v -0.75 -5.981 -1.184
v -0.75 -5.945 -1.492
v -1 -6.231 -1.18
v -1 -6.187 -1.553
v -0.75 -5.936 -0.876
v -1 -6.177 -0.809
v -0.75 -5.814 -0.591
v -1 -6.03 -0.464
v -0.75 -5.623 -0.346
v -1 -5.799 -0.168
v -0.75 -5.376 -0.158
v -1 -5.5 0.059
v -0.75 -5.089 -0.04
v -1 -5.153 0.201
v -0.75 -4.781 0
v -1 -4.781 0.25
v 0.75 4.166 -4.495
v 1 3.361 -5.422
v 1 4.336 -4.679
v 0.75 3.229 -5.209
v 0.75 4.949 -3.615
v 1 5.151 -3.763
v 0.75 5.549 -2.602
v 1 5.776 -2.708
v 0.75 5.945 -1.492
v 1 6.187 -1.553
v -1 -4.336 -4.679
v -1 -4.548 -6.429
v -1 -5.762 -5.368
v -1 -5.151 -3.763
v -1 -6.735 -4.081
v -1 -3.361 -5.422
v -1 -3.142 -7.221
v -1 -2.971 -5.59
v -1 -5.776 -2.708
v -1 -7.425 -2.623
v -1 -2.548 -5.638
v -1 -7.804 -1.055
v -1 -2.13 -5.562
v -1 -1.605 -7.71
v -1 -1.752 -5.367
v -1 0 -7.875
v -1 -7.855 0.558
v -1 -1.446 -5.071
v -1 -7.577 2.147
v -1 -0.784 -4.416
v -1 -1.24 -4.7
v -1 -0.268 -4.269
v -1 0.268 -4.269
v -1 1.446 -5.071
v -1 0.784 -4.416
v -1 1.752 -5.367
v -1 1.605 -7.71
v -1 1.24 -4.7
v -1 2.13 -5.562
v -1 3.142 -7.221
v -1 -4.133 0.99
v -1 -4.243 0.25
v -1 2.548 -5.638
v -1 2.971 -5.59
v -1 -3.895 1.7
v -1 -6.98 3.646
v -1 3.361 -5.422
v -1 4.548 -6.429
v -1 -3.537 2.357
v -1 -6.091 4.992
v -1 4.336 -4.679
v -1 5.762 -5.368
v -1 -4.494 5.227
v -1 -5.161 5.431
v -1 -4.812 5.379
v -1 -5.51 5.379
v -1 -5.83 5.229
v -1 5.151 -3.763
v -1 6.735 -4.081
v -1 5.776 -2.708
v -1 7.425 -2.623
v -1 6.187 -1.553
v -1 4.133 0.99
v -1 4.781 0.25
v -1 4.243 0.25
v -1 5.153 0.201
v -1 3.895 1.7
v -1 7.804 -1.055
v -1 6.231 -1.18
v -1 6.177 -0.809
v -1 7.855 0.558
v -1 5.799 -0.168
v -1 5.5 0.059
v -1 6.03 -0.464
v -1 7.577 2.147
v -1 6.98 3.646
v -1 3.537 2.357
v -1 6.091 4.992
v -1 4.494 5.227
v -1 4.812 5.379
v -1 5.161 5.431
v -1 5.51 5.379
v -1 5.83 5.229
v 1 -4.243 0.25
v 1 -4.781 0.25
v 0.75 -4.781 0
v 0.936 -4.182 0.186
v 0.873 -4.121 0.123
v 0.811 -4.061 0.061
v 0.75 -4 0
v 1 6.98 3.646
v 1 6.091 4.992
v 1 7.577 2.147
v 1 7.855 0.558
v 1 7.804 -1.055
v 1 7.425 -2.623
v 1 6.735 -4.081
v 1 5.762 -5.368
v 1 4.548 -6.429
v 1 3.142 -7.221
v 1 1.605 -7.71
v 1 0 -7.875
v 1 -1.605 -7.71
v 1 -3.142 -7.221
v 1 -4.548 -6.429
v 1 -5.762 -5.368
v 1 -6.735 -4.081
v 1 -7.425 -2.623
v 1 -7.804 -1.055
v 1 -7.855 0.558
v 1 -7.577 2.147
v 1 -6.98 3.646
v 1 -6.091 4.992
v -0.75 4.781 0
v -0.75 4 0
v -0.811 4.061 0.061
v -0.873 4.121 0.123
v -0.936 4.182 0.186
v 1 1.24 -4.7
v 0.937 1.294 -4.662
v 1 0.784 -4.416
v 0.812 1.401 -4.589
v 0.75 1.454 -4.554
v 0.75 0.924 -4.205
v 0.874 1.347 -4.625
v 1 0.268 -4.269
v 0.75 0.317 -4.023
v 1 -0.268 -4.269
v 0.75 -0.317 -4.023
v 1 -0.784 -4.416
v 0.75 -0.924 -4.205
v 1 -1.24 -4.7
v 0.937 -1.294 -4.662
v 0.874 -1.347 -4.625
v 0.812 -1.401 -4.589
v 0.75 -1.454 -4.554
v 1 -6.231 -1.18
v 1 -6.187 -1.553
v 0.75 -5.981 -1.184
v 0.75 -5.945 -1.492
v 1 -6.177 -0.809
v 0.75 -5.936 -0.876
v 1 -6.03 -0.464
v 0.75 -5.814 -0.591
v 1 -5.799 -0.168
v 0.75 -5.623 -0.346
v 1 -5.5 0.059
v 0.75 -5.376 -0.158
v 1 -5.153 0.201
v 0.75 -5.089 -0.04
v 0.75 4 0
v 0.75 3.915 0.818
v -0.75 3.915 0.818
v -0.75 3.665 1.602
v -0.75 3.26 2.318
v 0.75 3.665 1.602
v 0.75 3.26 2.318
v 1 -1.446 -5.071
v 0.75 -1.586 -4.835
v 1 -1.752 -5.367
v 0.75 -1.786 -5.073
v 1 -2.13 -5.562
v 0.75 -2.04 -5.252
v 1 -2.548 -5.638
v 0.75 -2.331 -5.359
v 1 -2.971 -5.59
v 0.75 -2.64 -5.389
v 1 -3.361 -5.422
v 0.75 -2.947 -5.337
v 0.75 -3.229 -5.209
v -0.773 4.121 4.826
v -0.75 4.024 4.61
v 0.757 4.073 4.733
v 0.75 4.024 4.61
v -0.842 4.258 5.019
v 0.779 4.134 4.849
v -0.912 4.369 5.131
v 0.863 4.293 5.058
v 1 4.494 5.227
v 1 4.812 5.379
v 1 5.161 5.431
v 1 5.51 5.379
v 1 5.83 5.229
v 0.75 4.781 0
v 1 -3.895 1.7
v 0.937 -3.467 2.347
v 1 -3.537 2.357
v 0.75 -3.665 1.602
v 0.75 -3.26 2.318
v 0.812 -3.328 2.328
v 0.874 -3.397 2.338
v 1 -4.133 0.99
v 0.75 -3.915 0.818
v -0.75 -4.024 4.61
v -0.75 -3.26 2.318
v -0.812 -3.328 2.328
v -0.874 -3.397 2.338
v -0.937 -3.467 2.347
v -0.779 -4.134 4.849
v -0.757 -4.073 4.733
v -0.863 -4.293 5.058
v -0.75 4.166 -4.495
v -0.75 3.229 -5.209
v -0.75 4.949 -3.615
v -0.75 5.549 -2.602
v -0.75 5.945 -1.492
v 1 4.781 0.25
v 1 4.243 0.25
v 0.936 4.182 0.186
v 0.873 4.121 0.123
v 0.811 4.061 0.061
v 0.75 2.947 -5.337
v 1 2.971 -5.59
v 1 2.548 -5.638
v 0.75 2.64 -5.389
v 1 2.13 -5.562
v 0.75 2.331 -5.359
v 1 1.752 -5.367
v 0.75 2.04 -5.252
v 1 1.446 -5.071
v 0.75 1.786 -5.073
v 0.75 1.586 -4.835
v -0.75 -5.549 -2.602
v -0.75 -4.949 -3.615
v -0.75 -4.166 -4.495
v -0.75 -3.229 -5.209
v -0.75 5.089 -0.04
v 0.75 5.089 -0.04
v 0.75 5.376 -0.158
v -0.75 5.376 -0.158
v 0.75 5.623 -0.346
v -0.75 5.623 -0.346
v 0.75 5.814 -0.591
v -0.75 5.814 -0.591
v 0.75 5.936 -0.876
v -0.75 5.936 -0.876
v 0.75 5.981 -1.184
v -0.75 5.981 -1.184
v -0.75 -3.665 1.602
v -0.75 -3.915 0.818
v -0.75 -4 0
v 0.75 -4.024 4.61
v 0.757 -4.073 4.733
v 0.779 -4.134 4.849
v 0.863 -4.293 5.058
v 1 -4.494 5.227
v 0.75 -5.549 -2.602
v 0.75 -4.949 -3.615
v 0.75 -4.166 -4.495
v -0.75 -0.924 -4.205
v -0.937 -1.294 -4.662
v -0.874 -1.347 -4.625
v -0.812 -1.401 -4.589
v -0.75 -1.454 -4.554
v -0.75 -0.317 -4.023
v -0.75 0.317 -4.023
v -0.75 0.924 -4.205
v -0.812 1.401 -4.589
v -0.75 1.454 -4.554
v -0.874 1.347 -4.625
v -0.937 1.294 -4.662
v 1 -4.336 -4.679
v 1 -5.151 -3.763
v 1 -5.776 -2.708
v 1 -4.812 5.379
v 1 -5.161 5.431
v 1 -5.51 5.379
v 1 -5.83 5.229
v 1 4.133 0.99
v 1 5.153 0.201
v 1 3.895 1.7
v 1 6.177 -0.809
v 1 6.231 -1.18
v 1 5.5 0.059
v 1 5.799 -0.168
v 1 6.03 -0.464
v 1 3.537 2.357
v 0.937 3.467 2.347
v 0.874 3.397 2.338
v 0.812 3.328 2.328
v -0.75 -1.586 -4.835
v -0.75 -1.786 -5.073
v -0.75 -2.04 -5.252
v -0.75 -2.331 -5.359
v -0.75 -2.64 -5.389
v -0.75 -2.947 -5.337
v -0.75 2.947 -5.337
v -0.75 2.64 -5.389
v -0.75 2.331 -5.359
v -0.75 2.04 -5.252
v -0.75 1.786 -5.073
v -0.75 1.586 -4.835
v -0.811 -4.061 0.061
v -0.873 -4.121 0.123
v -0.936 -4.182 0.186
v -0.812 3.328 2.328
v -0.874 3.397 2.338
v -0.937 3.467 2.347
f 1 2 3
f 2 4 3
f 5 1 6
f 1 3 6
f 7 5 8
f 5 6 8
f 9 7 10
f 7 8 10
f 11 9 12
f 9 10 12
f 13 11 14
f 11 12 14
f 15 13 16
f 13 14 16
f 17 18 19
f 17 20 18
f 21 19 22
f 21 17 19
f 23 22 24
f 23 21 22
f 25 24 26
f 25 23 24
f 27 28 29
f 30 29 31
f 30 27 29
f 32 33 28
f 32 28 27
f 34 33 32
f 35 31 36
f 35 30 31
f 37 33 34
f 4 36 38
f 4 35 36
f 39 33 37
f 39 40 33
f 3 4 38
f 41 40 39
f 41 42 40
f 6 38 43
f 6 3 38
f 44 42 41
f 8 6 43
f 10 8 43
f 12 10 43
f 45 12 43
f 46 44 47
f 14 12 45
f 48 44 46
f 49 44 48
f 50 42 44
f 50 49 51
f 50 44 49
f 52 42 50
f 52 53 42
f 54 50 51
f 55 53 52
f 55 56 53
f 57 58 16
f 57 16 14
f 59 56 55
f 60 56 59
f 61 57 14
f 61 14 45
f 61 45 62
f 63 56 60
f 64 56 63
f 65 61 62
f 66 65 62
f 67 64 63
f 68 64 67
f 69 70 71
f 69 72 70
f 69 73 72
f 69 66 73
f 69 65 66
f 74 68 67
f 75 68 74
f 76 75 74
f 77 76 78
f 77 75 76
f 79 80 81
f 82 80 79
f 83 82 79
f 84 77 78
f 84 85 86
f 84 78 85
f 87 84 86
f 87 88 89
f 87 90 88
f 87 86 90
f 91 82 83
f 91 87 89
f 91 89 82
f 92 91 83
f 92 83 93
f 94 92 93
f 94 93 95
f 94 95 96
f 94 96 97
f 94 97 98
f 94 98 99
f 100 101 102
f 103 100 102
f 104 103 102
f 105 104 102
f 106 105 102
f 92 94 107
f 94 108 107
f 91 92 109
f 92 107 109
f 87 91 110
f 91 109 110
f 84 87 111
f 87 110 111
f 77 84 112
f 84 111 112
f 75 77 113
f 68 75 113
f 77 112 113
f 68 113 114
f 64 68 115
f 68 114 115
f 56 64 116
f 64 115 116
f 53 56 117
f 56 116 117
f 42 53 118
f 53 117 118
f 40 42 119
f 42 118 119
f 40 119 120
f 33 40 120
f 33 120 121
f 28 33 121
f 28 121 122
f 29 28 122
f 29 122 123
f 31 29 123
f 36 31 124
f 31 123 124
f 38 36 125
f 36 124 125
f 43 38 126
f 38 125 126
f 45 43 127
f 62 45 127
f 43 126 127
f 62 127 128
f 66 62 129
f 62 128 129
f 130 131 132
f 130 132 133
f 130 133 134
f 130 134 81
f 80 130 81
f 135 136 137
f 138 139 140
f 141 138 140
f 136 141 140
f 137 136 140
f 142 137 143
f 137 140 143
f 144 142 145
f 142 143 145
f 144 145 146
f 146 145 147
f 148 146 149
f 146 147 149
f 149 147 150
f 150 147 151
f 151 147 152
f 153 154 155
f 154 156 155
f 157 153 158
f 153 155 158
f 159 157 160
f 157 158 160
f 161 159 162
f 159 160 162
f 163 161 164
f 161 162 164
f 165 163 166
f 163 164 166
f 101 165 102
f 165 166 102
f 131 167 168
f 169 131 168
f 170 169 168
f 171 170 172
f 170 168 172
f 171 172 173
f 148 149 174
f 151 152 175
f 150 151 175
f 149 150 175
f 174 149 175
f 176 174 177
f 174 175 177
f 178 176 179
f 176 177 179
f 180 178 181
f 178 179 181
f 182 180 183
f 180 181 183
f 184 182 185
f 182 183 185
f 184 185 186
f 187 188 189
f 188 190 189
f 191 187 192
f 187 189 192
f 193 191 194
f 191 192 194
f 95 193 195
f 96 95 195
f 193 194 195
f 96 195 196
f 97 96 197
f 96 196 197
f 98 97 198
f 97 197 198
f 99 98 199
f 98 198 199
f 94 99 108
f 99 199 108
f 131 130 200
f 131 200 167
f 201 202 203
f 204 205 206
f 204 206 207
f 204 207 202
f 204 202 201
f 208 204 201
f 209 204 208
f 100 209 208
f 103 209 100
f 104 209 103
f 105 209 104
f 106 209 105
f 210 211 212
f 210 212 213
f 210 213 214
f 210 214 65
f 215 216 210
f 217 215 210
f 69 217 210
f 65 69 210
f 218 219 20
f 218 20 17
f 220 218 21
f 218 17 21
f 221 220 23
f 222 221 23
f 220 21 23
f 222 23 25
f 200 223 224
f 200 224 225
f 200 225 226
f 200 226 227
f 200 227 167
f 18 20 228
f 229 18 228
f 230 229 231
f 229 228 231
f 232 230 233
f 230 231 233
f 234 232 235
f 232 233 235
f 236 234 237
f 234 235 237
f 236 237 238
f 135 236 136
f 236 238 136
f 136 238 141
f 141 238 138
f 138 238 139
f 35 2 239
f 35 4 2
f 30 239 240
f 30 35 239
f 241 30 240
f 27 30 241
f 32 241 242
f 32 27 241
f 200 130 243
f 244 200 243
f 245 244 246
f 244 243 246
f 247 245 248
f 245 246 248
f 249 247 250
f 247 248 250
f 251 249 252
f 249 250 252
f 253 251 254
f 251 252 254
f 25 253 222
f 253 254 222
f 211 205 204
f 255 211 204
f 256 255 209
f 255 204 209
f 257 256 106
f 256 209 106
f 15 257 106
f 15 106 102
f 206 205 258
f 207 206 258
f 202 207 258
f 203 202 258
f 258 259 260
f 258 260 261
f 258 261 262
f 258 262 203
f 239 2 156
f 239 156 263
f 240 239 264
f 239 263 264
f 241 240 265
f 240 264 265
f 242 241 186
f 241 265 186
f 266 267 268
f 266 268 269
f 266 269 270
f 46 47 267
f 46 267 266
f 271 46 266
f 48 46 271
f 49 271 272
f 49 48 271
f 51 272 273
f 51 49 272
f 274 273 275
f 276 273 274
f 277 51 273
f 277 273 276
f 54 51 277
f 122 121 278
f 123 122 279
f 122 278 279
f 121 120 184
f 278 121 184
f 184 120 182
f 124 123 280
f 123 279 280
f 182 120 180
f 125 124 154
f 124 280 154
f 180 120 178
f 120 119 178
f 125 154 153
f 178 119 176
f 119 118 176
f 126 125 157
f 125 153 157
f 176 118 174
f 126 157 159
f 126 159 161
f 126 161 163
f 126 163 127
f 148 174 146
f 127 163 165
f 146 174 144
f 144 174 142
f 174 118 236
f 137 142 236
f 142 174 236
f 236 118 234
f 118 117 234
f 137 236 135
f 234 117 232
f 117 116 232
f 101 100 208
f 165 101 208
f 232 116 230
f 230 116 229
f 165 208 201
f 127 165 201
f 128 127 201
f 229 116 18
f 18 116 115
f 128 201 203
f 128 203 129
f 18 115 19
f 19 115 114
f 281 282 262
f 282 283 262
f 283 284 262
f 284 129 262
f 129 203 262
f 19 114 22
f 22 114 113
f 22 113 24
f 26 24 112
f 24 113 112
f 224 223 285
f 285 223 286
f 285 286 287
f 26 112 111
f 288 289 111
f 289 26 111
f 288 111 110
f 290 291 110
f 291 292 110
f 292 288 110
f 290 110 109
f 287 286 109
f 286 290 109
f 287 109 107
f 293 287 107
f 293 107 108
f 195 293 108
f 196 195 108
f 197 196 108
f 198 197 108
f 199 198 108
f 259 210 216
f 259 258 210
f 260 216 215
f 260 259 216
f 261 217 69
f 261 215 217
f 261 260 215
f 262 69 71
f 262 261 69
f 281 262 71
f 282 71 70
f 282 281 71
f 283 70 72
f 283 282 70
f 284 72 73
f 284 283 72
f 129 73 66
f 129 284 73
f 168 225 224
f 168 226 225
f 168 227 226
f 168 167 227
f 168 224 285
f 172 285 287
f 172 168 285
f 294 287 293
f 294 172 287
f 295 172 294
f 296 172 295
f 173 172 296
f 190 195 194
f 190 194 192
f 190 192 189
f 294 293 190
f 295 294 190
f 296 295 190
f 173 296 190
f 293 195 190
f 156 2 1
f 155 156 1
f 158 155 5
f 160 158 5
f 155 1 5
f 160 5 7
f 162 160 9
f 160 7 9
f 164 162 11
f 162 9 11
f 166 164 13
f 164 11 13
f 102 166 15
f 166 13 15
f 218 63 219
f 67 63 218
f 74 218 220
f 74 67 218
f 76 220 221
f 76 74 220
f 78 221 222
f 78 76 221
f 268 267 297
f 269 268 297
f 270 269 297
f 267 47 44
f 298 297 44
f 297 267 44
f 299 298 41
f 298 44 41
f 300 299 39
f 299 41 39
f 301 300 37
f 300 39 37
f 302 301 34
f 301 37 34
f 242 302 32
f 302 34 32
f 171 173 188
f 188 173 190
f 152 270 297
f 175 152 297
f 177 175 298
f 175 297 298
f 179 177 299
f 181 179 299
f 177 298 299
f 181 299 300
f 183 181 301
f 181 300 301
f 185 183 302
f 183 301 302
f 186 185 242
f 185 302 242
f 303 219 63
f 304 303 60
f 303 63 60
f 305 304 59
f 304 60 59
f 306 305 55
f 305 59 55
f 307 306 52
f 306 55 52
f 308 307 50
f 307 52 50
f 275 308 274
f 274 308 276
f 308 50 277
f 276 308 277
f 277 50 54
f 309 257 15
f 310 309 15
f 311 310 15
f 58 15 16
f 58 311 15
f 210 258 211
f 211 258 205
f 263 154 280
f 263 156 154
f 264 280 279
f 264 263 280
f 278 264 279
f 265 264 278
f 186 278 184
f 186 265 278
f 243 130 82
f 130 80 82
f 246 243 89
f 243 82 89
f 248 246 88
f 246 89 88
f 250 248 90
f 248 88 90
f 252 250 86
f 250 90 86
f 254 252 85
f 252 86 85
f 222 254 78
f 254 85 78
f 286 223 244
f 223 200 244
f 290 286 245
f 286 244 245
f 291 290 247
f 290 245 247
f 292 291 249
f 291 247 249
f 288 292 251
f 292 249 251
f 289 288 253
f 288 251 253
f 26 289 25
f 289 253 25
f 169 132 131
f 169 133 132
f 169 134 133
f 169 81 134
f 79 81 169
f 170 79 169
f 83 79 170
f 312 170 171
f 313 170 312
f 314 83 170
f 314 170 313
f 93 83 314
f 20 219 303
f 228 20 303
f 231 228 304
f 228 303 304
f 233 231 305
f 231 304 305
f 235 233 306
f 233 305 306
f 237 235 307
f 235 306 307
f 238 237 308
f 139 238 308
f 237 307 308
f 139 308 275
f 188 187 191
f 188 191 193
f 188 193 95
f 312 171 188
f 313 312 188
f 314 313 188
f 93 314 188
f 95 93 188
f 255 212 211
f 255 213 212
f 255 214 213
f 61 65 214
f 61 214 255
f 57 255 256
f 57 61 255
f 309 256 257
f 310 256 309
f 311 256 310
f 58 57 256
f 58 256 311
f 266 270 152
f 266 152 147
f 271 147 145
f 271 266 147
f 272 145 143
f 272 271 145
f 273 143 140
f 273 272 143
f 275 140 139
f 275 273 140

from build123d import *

# Parameters (mm, degrees)
EXTRUDE1_DEPTH          = 1
FILLET1_R               = 1.2
CUT_EXTRUDE1_DEPTH      = 12.181737343
CUT_EXTRUDE1_DEPTH_BACK = 12.181737343
CHAMFER1_SIZE           = 0.25


with BuildPart() as part:
    # Sketch1 → Extrude1 (new, symmetric)
    with BuildSketch(Plane(origin=(0, 0, 0), x_dir=(0, 0, -1), z_dir=(1, 0, 0))):
        with BuildLine():
            Line((-6.381117354, -4.614863629), (-2.317843826, -3.26))
            ThreePointArc((-2.317843826, -3.26), (-1.216552506, -3.810511777), (0, -4))
            Line((0, -4), (0, -6.129032258))
            ThreePointArc((0, -6.129032258), (3.615250795, -4.949242175), (5.8386874, -1.864072388))
            Line((5.8386874, -1.864072388), (3.810511777, -1.216552506))
            ThreePointArc((3.810511777, -1.216552506), (4, 0), (3.810511777, 1.216552506))
            Line((3.810511777, 1.216552506), (5.8386874, 1.864072388))
            ThreePointArc((5.8386874, 1.864072388), (3.615250795, 4.949242175), (0, 6.129032258))
            Line((0, 6.129032258), (0, 4))
            ThreePointArc((0, 4), (-1.216552506, 3.810511777), (-2.317843826, 3.26))
            Line((-2.317843826, 3.26), (-6.381117354, 4.614863629))
            ThreePointArc((-6.381117354, 4.614863629), (7.875, 0), (-6.381117354, -4.614863629))
        make_face()
    extrude(amount=EXTRUDE1_DEPTH, both=True)

    # Fillet1
    fillet1_edges = [part.edges().sort_by_distance(p)[0] for p in [
        (0, -4.614863629, 6.381117354),
        (0, -6.129032258, 0),
        (0, -1.864072388, -5.8386874),
        (0, 1.864072388, -5.8386874),
        (0, 6.129032258, 0),
        (0, 4.614863629, 6.381117354),
    ]]
    fillet(fillet1_edges, radius=FILLET1_R)

    # Sketch4 → Cut-Extrude1 (cut, two sides: drawn at the far end of the back side and taken through both)
    with BuildSketch(Plane(origin=(0, 0, 0), x_dir=(0, 0, -1), z_dir=(1, 0, 0)).offset(-CUT_EXTRUDE1_DEPTH_BACK)):
        with BuildLine():
            Line((0, 4.780727874), (0, -4.780727874))
            ThreePointArc((0, -4.780727874), (0.461953903, -5.726924448), (1.492146597, -5.944622356))
            ThreePointArc((1.492146597, -5.944622356), (3.615250795, -4.949242175), (5.209194703, -3.229446851))
            ThreePointArc((5.209194703, -3.229446851), (5.315130469, -2.181846269), (4.554254966, -1.454001619))
            ThreePointArc((4.554254966, -1.454001619), (4, 0), (4.554254966, 1.454001619))
            ThreePointArc((4.554254966, 1.454001619), (5.315130469, 2.181846269), (5.209194703, 3.229446851))
            ThreePointArc((5.209194703, 3.229446851), (3.615250795, 4.949242175), (1.492146597, 5.944622356))
            ThreePointArc((1.492146597, 5.944622356), (0.461953903, 5.726924448), (0, 4.780727874))
        make_face()
    extrude(amount=CUT_EXTRUDE1_DEPTH + CUT_EXTRUDE1_DEPTH_BACK, mode=Mode.SUBTRACT)

    # Chamfer1
    # the kernel refuses this chamfer: 0.25 mm, written as the material it takes off along each edge
    with BuildSketch(Plane(origin=(1, 3.056631288, 1.707935428), x_dir=(0, 0.9486525372163972, -0.31632003356235944), z_dir=(0, 0.31632003356235944, 0.9486525372163972)), Plane(origin=(-1, 3.056631288, 1.707935428), x_dir=(1, 0, 0), z_dir=(0, 0.31632003356235944, 0.9486525372163972)), Plane(origin=(-1, -4.370192178, 5.647340899), x_dir=(1, 0, 0), z_dir=(0, 0.3163200335623596, -0.9486525372163971))) as chamfer1_piece_1:
        Polygon((CHAMFER1_SIZE, 0), (0, CHAMFER1_SIZE), (0, 0), align=None)
    extrude(amount=4.15263262, mode=Mode.SUBTRACT)
    with BuildSketch(Plane(origin=(1, 0, 0), x_dir=(0, 0.9871090886928867, -0.16004888946787105), z_dir=(0, -0.16004888946787105, -0.9871090886928867))) as chamfer1_piece_2:
        Polygon((4 + CHAMFER1_SIZE, 0), (4, -CHAMFER1_SIZE), (4, 0), align=None)
    revolve(axis=Axis((1, 0, 0), (1, 0, 0)), revolution_arc=53.832106013, mode=Mode.SUBTRACT)
    with BuildSketch(Plane(origin=(1, 4.780727874, -1.2), x_dir=(0, 0, 1), z_dir=(0, -1, 0))) as chamfer1_piece_3:
        Polygon((1.2 + CHAMFER1_SIZE, 0), (1.2, CHAMFER1_SIZE), (1.2, 0), align=None)
    revolve(axis=Axis((1, 4.780727874, -1.2), (-1, 0, 0)), revolution_arc=104.090576784, mode=Mode.SUBTRACT)
    with BuildSketch(Plane(origin=(1, 0, 0), x_dir=(0, 0.5269097493911834, -0.8499212410550288), z_dir=(0, -0.8499212410550288, -0.5269097493911834))) as chamfer1_piece_4:
        Polygon((6.129032258 + CHAMFER1_SIZE, 0), (6.129032258, -CHAMFER1_SIZE), (6.129032258, 0), align=None)
    revolve(axis=Axis((1, 0, 0), (1, 0, 0)), revolution_arc=44.112527376, mode=Mode.SUBTRACT)
    with BuildSketch(Plane(origin=(1, 2.597155152, -4.189289214), x_dir=(0, 0.5269097493911832, -0.8499212410550289), z_dir=(0, 0.8499212410550289, 0.5269097493911832))) as chamfer1_piece_5:
        Polygon((1.2 + CHAMFER1_SIZE, 0), (1.2, CHAMFER1_SIZE), (1.2, 0), align=None)
    revolve(axis=Axis((1, 2.597155152, -4.189289214), (-1, 0, 0)), revolution_arc=134.804277629, mode=Mode.SUBTRACT)
    with BuildSketch(Plane(origin=(1, 0, -6.18430093), x_dir=(0, 0.8535787339825979, 0.5209638614075505), z_dir=(0, 0.5209638614075505, -0.8535787339825979))) as chamfer1_piece_6:
        Polygon((2.18430093 - CHAMFER1_SIZE, 0), (2.18430093, -CHAMFER1_SIZE), (2.18430093, 0), align=None)
    revolve(axis=Axis((1, 0, -6.18430093), (1, 0, 0)), revolution_arc=117.206144707, mode=Mode.SUBTRACT)
    with BuildSketch(Plane(origin=(1, -2.597155152, -4.189289214), x_dir=(0, 0.9743410747854011, 0.22507658693437918), z_dir=(0, -0.22507658693437918, 0.9743410747854011))) as chamfer1_piece_7:
        Polygon((1.2 + CHAMFER1_SIZE, 0), (1.2, CHAMFER1_SIZE), (1.2, 0), align=None)
    revolve(axis=Axis((1, -2.597155152, -4.189289214), (-1, 0, 0)), revolution_arc=134.804277629, mode=Mode.SUBTRACT)
    with BuildSketch(Plane(origin=(1, 0, 0), x_dir=(0, -0.9699120685888933, -0.24345549738219877), z_dir=(0, -0.24345549738219877, 0.9699120685888933))) as chamfer1_piece_8:
        Polygon((6.129032258 + CHAMFER1_SIZE, 0), (6.129032258, -CHAMFER1_SIZE), (6.129032258, 0), align=None)
    revolve(axis=Axis((1, 0, 0), (1, 0, 0)), revolution_arc=44.112527376, mode=Mode.SUBTRACT)
    with BuildSketch(Plane(origin=(1, -4.780727874, -1.2), x_dir=(0, -0.9699120685888935, -0.24345549738219882), z_dir=(0, 0.24345549738219882, -0.9699120685888935))) as chamfer1_piece_9:
        Polygon((1.2 + CHAMFER1_SIZE, 0), (1.2, CHAMFER1_SIZE), (1.2, 0), align=None)
    revolve(axis=Axis((1, -4.780727874, -1.2), (-1, 0, 0)), revolution_arc=104.090576784, mode=Mode.SUBTRACT)
    with BuildSketch(Plane(origin=(1, -3.357079253, 0), x_dir=(0, 0, 1), z_dir=(0, -1, 0)), Plane(origin=(-1, 4.780727874, 0), x_dir=(1, 0, 0), z_dir=(0, -1, 0)), Plane(origin=(-1, -3.357079253, 0), x_dir=(1, 0, 0), z_dir=(0, -1, 0)), Plane(origin=(1, 4.780727874, 0), x_dir=(0, 0, 1), z_dir=(0, -1, 0))) as chamfer1_piece_10:
        Polygon((CHAMFER1_SIZE, 0), (0, CHAMFER1_SIZE), (0, 0), align=None)
    extrude(amount=1.423648621, mode=Mode.SUBTRACT)
    with BuildSketch(Plane(origin=(1, 0, 0), x_dir=(0, -0.7117518247217879, 0.702431021528239), z_dir=(0, 0.702431021528239, 0.7117518247217879))) as chamfer1_piece_11:
        Polygon((4 + CHAMFER1_SIZE, 0), (4, -CHAMFER1_SIZE), (4, 0), align=None)
    revolve(axis=Axis((1, 0, 0), (1, 0, 0)), revolution_arc=53.832106013, mode=Mode.SUBTRACT)
    with BuildSketch(Plane(origin=(1, -4.370192178, 5.647340899), x_dir=(-1, 0, 0), z_dir=(0, 0.3163200335623596, -0.9486525372163971))) as chamfer1_piece_12:
        Polygon((CHAMFER1_SIZE, 0), (0, -CHAMFER1_SIZE), (0, 0), align=None)
    extrude(amount=4.15263262, mode=Mode.SUBTRACT)
    with BuildSketch(Plane(origin=(-1, 0, 0), x_dir=(0, 0.9871090886928867, -0.16004888946787105), z_dir=(0, -0.16004888946787105, -0.9871090886928867))) as chamfer1_piece_13:
        Polygon((4, CHAMFER1_SIZE), (4 + CHAMFER1_SIZE, 0), (4, 0), align=None)
    revolve(axis=Axis((-1, 0, 0), (1, 0, 0)), revolution_arc=53.832106013, mode=Mode.SUBTRACT)
    with BuildSketch(Plane(origin=(-1, 4.780727874, -1.2), x_dir=(0, 0, 1), z_dir=(0, -1, 0))) as chamfer1_piece_14:
        Polygon((1.2, -CHAMFER1_SIZE), (1.2 + CHAMFER1_SIZE, 0), (1.2, 0), align=None)
    revolve(axis=Axis((-1, 4.780727874, -1.2), (-1, 0, 0)), revolution_arc=104.090576784, mode=Mode.SUBTRACT)
    with BuildSketch(Plane(origin=(-1, 0, 0), x_dir=(0, 0.5269097493911834, -0.8499212410550288), z_dir=(0, -0.8499212410550288, -0.5269097493911834))) as chamfer1_piece_15:
        Polygon((6.129032258, CHAMFER1_SIZE), (6.129032258 + CHAMFER1_SIZE, 0), (6.129032258, 0), align=None)
    revolve(axis=Axis((-1, 0, 0), (1, 0, 0)), revolution_arc=44.112527376, mode=Mode.SUBTRACT)
    with BuildSketch(Plane(origin=(-1, 2.597155152, -4.189289214), x_dir=(0, 0.5269097493911832, -0.8499212410550289), z_dir=(0, 0.8499212410550289, 0.5269097493911832))) as chamfer1_piece_16:
        Polygon((1.2, -CHAMFER1_SIZE), (1.2 + CHAMFER1_SIZE, 0), (1.2, 0), align=None)
    revolve(axis=Axis((-1, 2.597155152, -4.189289214), (-1, 0, 0)), revolution_arc=134.804277629, mode=Mode.SUBTRACT)
    with BuildSketch(Plane(origin=(-1, 0, -6.18430093), x_dir=(0, -0.8535787339825973, 0.5209638614075514), z_dir=(0, -0.5209638614075514, -0.8535787339825973))) as chamfer1_piece_17:
        Polygon((2.18430093, -CHAMFER1_SIZE), (2.18430093 - CHAMFER1_SIZE, 0), (2.18430093, 0), align=None)
    revolve(axis=Axis((-1, 0, -6.18430093), (-1, 0, 0)), revolution_arc=117.206144707, mode=Mode.SUBTRACT)
    with BuildSketch(Plane(origin=(-1, -2.597155152, -4.189289214), x_dir=(0, 0.9743410747854011, 0.22507658693437918), z_dir=(0, -0.22507658693437918, 0.9743410747854011))) as chamfer1_piece_18:
        Polygon((1.2, -CHAMFER1_SIZE), (1.2 + CHAMFER1_SIZE, 0), (1.2, 0), align=None)
    revolve(axis=Axis((-1, -2.597155152, -4.189289214), (-1, 0, 0)), revolution_arc=134.804277629, mode=Mode.SUBTRACT)
    with BuildSketch(Plane(origin=(-1, 0, 0), x_dir=(0, -0.9699120685888933, -0.24345549738219877), z_dir=(0, -0.24345549738219877, 0.9699120685888933))) as chamfer1_piece_19:
        Polygon((6.129032258, CHAMFER1_SIZE), (6.129032258 + CHAMFER1_SIZE, 0), (6.129032258, 0), align=None)
    revolve(axis=Axis((-1, 0, 0), (1, 0, 0)), revolution_arc=44.112527376, mode=Mode.SUBTRACT)
    with BuildSketch(Plane(origin=(-1, -4.780727874, -1.2), x_dir=(0, -0.9699120685888935, -0.24345549738219882), z_dir=(0, 0.24345549738219882, -0.9699120685888935))) as chamfer1_piece_20:
        Polygon((1.2, -CHAMFER1_SIZE), (1.2 + CHAMFER1_SIZE, 0), (1.2, 0), align=None)
    revolve(axis=Axis((-1, -4.780727874, -1.2), (-1, 0, 0)), revolution_arc=104.090576784, mode=Mode.SUBTRACT)
    with BuildSketch(Plane(origin=(-1, 0, 0), x_dir=(0, -0.7117518247217879, 0.702431021528239), z_dir=(0, 0.702431021528239, 0.7117518247217879))) as chamfer1_piece_21:
        Polygon((4, CHAMFER1_SIZE), (4 + CHAMFER1_SIZE, 0), (4, 0), align=None)
    revolve(axis=Axis((-1, 0, 0), (1, 0, 0)), revolution_arc=53.832106013, mode=Mode.SUBTRACT)


solid = part.part
